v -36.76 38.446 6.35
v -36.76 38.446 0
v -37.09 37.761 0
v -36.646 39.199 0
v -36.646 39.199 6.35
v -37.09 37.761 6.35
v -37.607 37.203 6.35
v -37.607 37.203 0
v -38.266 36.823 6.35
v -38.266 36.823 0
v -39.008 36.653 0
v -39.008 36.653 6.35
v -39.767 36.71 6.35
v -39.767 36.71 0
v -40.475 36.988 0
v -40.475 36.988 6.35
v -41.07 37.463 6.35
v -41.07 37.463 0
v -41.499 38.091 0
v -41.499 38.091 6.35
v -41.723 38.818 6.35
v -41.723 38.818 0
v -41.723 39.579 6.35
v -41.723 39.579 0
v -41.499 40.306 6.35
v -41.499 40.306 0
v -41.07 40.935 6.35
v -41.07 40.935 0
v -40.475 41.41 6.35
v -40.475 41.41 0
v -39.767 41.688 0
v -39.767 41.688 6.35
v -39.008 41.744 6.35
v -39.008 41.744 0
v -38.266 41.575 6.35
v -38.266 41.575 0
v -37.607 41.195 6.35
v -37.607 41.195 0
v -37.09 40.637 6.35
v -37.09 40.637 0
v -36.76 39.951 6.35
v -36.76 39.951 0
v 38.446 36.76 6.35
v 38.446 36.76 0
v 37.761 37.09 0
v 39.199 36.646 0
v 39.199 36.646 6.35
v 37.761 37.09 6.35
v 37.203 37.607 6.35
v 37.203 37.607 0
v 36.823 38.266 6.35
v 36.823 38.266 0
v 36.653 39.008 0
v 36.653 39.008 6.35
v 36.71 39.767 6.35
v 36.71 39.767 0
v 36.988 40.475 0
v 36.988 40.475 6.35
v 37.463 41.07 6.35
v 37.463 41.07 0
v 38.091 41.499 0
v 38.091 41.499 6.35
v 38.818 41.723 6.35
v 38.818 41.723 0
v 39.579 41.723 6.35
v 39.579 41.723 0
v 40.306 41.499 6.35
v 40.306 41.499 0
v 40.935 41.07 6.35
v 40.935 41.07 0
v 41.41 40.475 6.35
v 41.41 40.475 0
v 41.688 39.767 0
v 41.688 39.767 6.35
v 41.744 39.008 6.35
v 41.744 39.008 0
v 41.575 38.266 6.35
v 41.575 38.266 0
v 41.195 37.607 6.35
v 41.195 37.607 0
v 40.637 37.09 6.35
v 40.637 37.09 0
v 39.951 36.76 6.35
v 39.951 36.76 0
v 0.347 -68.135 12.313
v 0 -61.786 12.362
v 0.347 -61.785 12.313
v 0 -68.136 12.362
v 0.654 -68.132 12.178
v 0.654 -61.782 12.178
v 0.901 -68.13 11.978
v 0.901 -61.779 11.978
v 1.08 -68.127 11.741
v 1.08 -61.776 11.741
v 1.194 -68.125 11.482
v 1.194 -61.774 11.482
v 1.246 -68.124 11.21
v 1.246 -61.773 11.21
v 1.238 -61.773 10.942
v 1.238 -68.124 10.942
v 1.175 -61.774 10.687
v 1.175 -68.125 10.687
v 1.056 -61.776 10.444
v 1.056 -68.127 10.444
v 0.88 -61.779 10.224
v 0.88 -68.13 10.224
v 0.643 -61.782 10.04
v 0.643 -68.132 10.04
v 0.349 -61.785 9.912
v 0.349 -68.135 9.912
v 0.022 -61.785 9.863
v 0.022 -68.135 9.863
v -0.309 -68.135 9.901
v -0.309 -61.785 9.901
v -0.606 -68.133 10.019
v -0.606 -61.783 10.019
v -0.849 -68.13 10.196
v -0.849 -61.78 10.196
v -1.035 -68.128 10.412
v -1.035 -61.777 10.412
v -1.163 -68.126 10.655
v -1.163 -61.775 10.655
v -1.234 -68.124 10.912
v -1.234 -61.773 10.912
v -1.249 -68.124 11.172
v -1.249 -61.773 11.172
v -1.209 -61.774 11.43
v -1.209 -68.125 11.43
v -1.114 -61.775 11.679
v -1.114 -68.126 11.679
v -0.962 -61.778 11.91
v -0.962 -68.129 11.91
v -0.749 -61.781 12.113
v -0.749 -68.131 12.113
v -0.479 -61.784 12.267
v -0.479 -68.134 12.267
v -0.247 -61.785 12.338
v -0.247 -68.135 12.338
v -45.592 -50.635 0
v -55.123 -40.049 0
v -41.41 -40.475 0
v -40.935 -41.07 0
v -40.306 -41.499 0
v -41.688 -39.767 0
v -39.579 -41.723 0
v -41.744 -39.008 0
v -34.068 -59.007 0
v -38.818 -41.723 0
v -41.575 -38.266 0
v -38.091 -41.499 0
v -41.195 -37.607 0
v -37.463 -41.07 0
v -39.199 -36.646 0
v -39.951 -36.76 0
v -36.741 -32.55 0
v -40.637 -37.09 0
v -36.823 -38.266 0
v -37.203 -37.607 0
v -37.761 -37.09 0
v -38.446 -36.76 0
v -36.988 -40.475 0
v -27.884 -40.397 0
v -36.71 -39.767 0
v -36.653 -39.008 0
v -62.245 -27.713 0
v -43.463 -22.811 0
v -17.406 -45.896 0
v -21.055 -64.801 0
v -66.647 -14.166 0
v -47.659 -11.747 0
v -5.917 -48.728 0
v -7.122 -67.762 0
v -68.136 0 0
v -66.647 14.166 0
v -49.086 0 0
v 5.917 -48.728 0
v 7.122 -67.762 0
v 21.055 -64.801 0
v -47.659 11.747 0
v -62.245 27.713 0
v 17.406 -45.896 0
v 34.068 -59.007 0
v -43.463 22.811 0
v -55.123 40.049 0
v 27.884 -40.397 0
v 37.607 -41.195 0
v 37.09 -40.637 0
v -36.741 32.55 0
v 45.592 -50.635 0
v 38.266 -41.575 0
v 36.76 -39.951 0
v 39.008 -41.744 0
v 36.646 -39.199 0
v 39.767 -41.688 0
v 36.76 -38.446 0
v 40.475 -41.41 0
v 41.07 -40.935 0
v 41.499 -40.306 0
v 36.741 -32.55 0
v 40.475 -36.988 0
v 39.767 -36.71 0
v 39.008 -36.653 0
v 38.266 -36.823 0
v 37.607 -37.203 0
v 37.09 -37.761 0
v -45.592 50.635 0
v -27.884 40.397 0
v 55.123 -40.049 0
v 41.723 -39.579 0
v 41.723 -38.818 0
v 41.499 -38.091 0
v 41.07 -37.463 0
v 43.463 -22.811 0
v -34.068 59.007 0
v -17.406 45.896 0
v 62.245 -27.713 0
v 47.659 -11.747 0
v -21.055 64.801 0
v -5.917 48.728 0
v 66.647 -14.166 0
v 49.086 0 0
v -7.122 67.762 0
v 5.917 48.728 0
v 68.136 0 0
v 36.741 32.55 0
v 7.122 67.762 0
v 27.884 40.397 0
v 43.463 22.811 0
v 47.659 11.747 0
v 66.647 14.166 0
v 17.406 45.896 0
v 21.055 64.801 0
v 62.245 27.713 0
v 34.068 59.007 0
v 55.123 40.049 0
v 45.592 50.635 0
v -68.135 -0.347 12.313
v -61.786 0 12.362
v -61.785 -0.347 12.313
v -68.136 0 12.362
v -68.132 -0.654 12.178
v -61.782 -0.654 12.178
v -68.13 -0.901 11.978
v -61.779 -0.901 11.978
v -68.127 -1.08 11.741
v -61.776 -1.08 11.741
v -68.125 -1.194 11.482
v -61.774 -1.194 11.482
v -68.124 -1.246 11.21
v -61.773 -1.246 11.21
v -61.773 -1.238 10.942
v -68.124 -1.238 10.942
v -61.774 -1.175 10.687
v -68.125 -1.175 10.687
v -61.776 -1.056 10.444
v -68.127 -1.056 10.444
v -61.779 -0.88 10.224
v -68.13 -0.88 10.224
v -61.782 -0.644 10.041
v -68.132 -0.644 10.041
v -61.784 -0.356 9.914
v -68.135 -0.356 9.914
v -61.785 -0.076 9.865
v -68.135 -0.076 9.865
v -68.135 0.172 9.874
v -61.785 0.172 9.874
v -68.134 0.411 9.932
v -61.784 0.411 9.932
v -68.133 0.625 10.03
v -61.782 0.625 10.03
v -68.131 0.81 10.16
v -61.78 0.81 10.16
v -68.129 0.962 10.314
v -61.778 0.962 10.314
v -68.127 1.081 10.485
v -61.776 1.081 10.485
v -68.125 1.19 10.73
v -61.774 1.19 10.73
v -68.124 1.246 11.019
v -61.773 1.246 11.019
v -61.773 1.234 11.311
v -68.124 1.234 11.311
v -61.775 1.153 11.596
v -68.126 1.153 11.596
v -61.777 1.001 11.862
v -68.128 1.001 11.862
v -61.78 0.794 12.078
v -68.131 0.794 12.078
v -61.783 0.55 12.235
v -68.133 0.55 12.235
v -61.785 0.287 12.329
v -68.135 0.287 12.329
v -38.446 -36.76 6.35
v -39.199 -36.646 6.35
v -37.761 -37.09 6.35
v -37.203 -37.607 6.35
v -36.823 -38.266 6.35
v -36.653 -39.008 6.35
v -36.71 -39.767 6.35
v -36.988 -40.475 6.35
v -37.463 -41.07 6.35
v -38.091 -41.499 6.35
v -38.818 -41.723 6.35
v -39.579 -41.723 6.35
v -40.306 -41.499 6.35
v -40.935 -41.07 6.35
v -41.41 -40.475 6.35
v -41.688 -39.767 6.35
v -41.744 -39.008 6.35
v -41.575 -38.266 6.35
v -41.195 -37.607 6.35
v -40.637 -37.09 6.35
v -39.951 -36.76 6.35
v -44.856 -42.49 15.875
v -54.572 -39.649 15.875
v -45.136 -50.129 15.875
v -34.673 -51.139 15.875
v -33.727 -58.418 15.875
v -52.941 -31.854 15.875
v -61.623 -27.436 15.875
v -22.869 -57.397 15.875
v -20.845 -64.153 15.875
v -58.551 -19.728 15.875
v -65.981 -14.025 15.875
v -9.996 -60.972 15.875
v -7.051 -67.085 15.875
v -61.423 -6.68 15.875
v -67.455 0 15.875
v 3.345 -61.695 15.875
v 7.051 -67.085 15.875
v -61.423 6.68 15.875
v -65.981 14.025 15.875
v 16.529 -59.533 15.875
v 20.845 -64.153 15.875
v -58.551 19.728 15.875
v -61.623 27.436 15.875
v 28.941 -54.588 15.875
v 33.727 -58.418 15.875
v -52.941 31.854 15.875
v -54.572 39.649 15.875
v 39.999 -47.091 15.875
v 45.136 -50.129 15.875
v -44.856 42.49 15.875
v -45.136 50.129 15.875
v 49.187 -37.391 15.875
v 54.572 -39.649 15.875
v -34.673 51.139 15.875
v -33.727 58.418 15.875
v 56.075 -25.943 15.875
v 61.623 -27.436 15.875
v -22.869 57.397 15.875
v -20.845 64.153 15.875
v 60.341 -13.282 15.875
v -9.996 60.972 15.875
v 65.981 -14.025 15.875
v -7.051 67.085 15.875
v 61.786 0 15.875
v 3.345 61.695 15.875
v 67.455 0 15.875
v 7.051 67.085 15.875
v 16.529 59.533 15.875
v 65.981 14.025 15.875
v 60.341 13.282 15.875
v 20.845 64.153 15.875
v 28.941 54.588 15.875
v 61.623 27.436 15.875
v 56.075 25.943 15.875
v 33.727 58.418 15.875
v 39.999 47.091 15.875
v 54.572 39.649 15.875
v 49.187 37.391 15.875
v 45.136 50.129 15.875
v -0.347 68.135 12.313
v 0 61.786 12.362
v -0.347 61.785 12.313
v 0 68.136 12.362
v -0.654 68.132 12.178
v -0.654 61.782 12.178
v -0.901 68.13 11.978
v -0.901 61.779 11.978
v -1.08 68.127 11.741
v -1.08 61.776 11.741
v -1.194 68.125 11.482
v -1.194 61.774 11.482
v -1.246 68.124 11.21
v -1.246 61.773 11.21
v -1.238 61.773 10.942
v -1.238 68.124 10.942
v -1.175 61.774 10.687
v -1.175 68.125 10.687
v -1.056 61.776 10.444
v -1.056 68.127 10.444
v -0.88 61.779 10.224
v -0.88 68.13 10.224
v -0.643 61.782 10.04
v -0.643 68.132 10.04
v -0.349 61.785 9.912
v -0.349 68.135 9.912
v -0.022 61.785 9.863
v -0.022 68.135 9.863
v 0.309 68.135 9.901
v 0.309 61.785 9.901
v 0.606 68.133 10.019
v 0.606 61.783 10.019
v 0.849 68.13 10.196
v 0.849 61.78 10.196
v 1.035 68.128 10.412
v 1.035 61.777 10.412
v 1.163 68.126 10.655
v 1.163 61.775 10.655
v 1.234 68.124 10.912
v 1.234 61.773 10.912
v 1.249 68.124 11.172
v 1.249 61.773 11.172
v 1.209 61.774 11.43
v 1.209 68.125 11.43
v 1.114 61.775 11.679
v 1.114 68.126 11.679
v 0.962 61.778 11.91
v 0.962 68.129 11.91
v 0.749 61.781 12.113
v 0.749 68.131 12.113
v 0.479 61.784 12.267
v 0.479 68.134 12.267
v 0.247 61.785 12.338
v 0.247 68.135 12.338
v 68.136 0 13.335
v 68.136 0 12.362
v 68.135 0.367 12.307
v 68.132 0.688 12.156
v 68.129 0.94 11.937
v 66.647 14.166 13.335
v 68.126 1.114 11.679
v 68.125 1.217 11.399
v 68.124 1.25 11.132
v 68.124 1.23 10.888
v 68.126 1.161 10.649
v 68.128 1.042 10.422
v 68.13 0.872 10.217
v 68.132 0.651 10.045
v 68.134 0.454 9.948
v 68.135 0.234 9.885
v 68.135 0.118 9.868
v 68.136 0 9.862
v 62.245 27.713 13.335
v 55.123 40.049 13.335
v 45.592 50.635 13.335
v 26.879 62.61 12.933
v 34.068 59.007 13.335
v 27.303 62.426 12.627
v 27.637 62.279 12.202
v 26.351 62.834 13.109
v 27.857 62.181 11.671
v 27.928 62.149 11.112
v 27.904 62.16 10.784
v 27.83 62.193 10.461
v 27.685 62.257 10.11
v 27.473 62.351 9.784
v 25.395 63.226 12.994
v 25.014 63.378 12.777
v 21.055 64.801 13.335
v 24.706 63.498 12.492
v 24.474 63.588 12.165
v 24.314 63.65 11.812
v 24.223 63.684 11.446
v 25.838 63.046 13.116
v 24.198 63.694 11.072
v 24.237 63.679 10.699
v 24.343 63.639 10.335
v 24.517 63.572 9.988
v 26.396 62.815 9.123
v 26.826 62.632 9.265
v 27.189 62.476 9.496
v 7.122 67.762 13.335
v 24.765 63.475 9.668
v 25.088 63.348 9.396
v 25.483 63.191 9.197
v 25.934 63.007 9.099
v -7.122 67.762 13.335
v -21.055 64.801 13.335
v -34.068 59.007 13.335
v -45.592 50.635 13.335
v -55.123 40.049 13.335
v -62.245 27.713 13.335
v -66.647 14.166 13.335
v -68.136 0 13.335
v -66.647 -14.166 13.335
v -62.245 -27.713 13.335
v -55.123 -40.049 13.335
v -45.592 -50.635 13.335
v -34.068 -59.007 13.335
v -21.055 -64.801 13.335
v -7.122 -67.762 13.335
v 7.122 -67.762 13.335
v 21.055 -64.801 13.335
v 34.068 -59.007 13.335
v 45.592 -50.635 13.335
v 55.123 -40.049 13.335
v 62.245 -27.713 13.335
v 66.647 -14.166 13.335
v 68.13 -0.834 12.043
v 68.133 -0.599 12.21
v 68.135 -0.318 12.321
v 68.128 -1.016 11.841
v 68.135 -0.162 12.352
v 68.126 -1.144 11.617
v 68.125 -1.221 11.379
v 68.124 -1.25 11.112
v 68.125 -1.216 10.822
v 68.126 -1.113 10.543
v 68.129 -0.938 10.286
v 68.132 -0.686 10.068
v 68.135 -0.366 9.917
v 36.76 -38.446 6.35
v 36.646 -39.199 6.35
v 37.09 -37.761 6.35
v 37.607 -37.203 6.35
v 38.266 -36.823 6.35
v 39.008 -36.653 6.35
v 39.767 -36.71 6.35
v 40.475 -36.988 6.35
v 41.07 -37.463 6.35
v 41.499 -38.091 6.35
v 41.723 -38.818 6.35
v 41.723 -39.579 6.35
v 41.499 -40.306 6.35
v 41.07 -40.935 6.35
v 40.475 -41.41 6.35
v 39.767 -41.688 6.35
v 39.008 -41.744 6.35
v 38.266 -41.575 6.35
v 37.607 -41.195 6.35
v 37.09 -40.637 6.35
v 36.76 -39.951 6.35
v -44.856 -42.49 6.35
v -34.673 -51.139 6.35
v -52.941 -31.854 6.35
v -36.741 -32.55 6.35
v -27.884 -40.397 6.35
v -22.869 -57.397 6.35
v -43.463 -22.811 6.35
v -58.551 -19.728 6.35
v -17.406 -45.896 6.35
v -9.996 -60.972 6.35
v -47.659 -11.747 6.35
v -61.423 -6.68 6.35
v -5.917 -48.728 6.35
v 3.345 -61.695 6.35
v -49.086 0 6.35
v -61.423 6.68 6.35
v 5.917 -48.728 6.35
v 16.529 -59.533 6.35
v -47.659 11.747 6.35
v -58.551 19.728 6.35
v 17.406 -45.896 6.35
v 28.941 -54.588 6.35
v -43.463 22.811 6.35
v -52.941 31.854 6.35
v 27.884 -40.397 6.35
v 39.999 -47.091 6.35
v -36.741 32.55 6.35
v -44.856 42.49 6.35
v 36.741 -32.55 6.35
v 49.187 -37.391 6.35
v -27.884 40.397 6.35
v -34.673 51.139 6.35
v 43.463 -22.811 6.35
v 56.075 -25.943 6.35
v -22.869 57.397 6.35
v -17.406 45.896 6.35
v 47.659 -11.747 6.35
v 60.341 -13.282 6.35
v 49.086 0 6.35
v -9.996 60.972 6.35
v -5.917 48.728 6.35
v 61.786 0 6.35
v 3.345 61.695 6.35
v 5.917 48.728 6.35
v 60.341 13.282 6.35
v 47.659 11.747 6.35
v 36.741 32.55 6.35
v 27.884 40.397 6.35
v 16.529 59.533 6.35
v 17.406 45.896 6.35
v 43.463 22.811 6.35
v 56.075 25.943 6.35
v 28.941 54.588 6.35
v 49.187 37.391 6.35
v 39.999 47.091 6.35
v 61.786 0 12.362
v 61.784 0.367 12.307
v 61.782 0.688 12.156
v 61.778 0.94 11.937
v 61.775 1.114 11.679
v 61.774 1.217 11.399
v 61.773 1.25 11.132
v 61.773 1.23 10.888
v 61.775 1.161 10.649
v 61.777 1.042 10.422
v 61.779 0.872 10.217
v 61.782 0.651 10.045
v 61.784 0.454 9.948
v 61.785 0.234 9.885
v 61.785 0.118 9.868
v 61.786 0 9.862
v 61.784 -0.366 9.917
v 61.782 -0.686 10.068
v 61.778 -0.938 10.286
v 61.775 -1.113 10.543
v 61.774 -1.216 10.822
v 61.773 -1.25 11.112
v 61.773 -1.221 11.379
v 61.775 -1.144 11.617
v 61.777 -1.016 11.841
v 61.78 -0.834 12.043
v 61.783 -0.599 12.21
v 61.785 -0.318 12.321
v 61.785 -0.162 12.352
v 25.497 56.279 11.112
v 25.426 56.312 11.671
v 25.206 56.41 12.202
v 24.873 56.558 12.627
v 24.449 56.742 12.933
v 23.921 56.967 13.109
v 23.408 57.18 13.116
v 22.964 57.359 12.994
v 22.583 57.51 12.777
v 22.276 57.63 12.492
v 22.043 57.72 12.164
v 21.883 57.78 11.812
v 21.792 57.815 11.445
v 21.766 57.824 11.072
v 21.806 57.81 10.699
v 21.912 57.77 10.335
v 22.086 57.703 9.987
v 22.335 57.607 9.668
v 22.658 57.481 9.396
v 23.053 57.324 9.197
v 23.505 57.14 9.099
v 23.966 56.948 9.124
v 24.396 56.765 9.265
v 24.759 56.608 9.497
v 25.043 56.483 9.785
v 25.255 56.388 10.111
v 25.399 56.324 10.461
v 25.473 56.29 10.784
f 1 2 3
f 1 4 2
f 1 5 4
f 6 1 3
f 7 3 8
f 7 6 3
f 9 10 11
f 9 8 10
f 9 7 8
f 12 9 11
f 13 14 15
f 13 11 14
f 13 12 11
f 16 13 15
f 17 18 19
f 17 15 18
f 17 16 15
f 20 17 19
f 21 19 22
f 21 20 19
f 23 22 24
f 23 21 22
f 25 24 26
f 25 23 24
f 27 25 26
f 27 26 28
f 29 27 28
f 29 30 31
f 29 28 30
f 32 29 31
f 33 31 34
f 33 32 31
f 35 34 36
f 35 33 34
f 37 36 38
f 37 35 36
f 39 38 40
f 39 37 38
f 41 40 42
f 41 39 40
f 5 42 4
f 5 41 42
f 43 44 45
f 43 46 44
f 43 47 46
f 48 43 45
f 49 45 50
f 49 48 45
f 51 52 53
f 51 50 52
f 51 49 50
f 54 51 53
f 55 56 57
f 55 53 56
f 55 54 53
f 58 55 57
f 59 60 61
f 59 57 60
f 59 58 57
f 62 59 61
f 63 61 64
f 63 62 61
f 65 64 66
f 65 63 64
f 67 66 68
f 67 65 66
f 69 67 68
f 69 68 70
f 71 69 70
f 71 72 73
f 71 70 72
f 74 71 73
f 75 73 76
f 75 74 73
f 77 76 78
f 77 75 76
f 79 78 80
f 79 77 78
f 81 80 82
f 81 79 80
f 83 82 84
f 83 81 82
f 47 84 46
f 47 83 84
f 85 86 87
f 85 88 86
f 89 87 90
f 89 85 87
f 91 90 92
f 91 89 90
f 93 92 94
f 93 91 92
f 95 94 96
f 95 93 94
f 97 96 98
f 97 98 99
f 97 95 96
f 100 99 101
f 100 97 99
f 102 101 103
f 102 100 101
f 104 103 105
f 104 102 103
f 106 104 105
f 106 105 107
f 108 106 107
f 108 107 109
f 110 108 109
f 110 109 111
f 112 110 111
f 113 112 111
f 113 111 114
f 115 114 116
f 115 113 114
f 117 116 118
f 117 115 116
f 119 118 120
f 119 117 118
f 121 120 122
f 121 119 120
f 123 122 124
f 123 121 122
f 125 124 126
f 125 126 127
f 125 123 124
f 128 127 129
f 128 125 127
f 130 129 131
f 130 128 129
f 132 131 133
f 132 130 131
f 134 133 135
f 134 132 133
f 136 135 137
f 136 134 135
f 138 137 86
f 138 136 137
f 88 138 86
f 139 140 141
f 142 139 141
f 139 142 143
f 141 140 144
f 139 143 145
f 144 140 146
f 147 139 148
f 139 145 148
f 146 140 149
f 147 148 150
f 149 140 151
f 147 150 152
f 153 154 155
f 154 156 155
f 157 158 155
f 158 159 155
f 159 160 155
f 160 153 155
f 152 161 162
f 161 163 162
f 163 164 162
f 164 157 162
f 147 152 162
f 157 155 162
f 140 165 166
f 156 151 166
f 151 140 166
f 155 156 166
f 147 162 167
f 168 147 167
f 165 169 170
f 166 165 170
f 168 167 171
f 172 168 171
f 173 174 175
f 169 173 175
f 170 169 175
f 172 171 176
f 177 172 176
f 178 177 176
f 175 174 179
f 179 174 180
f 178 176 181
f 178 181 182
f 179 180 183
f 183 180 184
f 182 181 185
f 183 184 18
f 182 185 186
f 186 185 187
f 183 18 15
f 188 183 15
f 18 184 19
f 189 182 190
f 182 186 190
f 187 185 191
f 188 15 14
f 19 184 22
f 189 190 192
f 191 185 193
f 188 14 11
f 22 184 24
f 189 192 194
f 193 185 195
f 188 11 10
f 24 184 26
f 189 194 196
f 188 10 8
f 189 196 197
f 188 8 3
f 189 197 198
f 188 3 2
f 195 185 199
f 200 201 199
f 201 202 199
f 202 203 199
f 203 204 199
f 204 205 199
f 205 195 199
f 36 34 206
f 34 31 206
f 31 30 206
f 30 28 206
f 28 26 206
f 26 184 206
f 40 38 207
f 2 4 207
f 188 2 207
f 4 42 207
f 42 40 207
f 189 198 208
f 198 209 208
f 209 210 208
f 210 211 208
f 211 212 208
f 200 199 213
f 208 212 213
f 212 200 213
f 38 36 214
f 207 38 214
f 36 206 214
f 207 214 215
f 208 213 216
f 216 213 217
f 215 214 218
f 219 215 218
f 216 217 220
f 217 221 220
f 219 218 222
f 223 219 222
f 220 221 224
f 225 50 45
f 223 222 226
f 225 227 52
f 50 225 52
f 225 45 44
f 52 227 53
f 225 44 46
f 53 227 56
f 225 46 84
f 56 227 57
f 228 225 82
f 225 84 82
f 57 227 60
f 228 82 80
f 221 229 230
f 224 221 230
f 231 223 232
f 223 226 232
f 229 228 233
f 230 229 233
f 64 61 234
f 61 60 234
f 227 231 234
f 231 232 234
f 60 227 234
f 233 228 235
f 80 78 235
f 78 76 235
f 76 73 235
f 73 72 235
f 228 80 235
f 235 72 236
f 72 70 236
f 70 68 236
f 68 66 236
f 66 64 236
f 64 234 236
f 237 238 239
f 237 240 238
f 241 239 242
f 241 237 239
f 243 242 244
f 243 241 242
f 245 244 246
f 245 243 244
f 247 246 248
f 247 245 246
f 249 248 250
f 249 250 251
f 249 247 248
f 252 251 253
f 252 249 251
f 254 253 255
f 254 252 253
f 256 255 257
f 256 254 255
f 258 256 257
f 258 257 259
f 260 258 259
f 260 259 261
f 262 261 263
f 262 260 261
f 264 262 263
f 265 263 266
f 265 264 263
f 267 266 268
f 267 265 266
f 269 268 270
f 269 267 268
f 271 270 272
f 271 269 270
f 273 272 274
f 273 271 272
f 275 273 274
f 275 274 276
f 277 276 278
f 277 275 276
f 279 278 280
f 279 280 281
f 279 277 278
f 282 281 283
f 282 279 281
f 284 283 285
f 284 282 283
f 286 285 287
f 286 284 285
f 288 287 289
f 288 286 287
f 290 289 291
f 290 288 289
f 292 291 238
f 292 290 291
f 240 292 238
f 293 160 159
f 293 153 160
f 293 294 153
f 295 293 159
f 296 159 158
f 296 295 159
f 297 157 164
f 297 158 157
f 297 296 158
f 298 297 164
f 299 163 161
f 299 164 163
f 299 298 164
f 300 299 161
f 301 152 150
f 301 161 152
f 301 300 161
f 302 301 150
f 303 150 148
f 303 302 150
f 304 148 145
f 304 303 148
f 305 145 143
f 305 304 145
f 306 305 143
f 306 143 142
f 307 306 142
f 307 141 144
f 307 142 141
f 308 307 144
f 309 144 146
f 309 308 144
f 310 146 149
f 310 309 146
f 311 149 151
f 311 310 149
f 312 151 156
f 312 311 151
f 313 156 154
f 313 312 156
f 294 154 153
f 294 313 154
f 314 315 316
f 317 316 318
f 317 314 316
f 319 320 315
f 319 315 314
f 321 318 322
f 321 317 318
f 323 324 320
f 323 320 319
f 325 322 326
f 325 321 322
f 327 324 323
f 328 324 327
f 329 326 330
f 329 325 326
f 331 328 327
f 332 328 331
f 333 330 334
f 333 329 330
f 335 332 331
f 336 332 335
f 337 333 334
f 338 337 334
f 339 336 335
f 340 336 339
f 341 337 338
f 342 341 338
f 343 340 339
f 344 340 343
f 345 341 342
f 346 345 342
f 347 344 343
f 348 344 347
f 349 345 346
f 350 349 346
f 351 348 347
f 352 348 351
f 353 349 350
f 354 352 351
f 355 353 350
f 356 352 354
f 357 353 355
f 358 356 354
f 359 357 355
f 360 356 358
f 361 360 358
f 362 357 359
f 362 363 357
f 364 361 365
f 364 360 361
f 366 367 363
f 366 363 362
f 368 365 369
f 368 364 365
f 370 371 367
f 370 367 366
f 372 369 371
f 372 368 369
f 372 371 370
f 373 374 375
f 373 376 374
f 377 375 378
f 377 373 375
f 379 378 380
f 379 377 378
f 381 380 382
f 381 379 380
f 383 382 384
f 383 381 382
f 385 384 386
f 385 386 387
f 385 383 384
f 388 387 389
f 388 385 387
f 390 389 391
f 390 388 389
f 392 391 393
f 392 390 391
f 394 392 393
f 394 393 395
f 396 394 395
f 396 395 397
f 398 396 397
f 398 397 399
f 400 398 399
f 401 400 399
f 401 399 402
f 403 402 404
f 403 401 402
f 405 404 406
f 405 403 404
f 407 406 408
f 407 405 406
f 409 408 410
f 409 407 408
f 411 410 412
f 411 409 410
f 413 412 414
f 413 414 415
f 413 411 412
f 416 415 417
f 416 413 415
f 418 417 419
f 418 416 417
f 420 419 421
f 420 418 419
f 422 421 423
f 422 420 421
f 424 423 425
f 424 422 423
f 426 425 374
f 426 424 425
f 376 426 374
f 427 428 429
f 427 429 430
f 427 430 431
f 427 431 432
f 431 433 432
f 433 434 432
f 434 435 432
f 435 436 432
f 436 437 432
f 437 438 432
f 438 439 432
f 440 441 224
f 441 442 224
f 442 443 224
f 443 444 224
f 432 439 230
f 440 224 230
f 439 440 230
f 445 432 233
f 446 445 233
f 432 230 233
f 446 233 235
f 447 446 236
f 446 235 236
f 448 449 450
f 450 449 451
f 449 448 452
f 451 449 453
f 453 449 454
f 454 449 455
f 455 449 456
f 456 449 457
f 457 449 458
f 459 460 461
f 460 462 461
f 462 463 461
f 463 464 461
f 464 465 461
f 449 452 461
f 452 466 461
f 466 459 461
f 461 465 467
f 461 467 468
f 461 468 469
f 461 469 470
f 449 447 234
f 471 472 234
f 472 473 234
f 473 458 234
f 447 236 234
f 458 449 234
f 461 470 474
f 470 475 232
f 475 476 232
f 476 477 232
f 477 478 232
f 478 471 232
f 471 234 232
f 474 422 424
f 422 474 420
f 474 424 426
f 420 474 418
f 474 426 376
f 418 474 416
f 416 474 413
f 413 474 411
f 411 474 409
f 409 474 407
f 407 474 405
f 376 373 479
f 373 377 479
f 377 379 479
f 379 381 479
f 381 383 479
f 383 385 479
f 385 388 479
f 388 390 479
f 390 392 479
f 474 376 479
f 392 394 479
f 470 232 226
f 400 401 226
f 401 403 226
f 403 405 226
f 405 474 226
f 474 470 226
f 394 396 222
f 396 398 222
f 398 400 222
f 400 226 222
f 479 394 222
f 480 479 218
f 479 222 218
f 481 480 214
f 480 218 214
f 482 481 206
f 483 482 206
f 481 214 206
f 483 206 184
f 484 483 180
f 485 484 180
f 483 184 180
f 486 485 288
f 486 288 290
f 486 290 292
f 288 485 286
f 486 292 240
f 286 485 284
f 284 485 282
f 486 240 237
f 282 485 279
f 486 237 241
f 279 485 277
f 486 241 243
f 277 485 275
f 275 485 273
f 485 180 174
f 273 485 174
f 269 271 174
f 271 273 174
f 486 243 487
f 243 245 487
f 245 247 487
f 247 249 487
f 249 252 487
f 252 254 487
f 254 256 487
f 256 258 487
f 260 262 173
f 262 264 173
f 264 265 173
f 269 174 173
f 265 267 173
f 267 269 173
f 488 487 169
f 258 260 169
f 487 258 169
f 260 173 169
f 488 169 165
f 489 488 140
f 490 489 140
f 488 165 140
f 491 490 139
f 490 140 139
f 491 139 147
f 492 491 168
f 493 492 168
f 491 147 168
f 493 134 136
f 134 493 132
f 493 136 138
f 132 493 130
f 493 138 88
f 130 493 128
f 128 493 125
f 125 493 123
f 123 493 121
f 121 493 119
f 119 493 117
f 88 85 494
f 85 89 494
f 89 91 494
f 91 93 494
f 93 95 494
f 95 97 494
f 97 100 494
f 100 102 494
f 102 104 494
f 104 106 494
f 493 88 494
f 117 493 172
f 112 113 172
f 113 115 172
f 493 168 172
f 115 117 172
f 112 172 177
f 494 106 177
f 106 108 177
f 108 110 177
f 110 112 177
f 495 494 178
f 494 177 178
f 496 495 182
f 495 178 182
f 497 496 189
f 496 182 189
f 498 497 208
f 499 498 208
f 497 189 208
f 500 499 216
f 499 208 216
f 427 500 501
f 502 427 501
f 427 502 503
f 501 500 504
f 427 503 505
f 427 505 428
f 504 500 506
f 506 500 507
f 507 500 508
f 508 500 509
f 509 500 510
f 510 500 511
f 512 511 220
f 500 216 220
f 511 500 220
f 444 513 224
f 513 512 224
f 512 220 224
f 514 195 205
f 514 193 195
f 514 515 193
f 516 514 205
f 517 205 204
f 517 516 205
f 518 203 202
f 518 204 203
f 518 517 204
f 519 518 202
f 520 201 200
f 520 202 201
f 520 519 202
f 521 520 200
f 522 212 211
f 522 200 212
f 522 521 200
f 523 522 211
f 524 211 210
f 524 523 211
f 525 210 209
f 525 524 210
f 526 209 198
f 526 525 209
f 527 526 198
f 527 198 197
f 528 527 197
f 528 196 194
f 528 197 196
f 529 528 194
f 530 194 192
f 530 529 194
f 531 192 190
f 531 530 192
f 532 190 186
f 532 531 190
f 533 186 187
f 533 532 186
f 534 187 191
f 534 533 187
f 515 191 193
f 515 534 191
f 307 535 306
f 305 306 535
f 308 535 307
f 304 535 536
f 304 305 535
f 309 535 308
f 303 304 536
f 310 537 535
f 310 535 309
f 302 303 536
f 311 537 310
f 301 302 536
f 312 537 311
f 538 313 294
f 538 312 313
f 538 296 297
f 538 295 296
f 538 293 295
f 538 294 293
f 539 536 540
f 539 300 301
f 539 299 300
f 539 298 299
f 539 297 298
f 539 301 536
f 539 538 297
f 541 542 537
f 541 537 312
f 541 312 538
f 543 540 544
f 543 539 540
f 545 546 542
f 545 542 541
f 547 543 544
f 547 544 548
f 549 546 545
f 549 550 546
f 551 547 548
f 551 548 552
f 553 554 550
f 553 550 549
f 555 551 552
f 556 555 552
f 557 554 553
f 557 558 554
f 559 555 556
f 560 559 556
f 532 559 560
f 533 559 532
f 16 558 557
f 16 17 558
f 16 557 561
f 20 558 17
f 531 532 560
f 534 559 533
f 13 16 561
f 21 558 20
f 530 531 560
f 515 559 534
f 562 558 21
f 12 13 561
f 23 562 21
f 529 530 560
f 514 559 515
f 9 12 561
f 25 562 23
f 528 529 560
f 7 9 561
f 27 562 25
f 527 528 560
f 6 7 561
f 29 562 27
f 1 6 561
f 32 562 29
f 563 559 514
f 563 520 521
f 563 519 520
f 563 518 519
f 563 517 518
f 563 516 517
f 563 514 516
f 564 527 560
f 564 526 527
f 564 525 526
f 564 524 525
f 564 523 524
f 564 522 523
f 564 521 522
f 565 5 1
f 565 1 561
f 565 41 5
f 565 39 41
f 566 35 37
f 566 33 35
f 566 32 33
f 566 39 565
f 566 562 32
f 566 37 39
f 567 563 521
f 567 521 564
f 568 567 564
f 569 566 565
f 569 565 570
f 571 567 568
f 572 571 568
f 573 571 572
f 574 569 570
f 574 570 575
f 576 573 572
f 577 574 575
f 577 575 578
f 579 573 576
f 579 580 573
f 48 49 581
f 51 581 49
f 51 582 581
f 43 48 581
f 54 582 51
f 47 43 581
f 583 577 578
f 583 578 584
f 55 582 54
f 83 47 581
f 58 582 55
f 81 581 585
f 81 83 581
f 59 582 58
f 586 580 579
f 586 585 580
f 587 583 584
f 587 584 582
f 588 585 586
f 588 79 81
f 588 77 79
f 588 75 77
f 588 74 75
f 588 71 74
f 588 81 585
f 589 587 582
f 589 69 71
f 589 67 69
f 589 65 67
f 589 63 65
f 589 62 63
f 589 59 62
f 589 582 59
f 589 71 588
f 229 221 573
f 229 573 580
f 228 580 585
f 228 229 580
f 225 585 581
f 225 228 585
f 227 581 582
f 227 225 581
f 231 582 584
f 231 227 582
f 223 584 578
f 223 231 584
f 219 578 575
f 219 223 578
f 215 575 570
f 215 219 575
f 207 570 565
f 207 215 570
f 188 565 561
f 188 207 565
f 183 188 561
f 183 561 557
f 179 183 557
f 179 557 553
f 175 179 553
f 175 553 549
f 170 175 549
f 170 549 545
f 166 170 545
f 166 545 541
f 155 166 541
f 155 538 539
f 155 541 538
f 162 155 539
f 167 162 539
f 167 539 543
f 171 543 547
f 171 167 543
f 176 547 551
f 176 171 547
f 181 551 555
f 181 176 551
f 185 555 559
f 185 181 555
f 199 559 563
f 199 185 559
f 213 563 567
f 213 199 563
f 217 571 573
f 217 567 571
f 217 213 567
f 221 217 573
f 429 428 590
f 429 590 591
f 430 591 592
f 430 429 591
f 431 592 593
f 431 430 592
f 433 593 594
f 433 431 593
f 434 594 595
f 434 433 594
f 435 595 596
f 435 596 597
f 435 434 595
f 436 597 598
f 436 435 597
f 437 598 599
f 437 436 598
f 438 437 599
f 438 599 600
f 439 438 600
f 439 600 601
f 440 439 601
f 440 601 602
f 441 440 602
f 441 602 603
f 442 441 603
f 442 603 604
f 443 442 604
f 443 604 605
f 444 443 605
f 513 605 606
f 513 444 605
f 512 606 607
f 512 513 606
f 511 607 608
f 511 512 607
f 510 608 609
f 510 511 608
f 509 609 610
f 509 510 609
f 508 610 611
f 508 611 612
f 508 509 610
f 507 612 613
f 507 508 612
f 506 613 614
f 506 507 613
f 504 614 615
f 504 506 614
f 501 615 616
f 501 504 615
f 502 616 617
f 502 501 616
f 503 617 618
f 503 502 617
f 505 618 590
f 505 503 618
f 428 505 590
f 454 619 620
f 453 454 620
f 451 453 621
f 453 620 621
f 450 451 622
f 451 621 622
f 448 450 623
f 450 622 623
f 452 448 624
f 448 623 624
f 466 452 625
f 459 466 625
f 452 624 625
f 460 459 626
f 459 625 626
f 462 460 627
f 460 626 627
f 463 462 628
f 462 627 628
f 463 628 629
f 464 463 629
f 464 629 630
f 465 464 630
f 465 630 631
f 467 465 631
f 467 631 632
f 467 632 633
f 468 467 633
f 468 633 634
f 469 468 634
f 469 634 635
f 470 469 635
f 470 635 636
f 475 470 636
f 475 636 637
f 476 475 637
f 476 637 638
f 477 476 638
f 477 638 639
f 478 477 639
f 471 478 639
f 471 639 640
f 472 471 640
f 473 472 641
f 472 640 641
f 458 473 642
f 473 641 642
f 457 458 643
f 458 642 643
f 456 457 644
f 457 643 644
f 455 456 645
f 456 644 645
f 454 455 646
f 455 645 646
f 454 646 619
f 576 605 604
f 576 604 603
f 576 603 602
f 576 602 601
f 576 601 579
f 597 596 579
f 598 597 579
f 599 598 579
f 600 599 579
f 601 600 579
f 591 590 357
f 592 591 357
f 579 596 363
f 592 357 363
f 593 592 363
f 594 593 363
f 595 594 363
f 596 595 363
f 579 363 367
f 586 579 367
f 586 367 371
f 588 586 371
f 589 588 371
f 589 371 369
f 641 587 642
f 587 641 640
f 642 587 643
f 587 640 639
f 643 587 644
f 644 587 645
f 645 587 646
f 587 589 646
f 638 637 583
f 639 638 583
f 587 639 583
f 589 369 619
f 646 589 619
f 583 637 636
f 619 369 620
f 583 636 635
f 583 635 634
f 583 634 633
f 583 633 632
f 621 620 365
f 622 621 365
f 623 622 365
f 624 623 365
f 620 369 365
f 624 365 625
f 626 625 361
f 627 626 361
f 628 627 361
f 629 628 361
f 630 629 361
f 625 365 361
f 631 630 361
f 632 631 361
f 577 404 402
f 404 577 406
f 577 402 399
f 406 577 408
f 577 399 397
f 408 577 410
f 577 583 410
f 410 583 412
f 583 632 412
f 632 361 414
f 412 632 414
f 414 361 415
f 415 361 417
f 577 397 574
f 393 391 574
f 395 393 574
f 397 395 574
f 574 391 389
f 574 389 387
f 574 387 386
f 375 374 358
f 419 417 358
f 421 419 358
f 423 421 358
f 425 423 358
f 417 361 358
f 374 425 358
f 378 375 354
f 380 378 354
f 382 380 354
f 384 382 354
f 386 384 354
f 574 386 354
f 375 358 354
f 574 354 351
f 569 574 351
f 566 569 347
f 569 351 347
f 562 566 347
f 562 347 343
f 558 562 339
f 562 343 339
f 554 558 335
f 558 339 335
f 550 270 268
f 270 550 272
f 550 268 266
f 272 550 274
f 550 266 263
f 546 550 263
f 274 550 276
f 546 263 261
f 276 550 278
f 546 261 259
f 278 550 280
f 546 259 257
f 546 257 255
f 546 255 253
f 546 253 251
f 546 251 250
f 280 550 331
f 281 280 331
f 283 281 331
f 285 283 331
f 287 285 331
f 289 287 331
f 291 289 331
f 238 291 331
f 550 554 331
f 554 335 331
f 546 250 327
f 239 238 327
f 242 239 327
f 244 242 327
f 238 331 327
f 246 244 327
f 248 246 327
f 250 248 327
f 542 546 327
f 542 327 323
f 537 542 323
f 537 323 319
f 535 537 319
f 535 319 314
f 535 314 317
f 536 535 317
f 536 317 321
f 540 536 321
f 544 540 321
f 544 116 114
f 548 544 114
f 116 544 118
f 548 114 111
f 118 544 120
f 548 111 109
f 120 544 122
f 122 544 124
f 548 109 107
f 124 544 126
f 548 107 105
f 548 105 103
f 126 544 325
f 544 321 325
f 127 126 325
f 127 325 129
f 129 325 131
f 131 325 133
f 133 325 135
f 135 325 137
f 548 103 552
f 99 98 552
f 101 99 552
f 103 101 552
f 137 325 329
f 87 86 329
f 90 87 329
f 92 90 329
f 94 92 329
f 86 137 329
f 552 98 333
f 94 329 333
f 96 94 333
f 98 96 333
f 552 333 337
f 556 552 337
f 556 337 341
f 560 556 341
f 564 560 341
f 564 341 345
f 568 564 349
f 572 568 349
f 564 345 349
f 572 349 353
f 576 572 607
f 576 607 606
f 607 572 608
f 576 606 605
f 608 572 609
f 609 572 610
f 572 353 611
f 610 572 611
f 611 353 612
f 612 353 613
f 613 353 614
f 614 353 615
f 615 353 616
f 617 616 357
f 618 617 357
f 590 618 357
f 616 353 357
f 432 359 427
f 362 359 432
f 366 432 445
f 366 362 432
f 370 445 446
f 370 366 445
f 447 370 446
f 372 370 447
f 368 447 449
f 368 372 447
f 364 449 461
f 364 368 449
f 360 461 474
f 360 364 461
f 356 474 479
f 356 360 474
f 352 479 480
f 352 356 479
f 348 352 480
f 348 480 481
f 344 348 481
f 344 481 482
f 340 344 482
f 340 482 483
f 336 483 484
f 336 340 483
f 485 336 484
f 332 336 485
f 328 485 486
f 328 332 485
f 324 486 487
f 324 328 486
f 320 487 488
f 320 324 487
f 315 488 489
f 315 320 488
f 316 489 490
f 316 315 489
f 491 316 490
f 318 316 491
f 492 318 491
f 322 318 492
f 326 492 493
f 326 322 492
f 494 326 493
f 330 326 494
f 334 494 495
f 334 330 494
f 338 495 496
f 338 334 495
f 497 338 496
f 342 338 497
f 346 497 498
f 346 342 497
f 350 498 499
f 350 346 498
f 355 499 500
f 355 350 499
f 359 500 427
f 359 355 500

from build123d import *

# Parameters (mm, degrees)
SKETCH1_R                      = 68.1355
SKETCH1_R_2                    = 49.0855
EXTRUDE1_DEPTH                 = 15.875
SKETCH2_R                      = 61.7855
EXTRUDE2_DEPTH                 = 9.525
TAP_DRILL_FOR_10_32_TAP1_D     = 4.0386
TAP_DRILL_FOR_10_32_TAP1_DEPTH = 12.7
TAP_DRILL_FOR_10_32_TAP1_TIP   = 1.213317848
CIRPATTERN1_COUNT              = 4
CIRPATTERN2_COUNT              = 4
CHAMFER1_SIZE                  = 2.54
CHAMFER1_SIZE2                 = 0.680590949


with BuildPart() as part:
    # Sketch1 → Extrude1 (new body)
    with BuildSketch(Plane.XY):
        Circle(SKETCH1_R)
        Circle(SKETCH1_R_2, mode=Mode.SUBTRACT)
    extrude(amount=EXTRUDE1_DEPTH)

    # Sketch2 → Extrude2 (cut)
    with BuildSketch(Plane.XY.offset(15.875)):
        Circle(SKETCH2_R)
    extrude(amount=-EXTRUDE2_DEPTH, mode=Mode.SUBTRACT)

    # Tap Drill for #10-32 Tap1
    with Locations(Plane(origin=(26.074327006, 62.948993887, 11.1125), x_dir=(-0.9238795325112864, 0.38268343236509067, 0), z_dir=(0.38268343236509067, 0.9238795325112864, 0))):
        with Locations((0, 0)):
            Hole(TAP_DRILL_FOR_10_32_TAP1_D / 2, depth=TAP_DRILL_FOR_10_32_TAP1_DEPTH)
            with Locations((0, 0, -(TAP_DRILL_FOR_10_32_TAP1_DEPTH + TAP_DRILL_FOR_10_32_TAP1_TIP / 2))):  # 118° drill point
                Cone(0, TAP_DRILL_FOR_10_32_TAP1_D / 2, TAP_DRILL_FOR_10_32_TAP1_TIP, mode=Mode.SUBTRACT)

    # Sketch4 → M3x0.5 Tapped Hole1 (revolve, cut)
    with BuildSketch(Plane(origin=(0, 68.1355, 11.1125), x_dir=(0, 0, 1), z_dir=(1, 0, 0))):
        Polygon((0, 0), (0, 9.387075774), (1.25, 8.636), (1.25, 0), align=None)
    m3x0_5_tapped_hole1 = revolve(axis=Axis((0, 74.4855, 11.1125), (0, -1, 0)), mode=Mode.SUBTRACT)

    # CirPattern1: M3x0.5 Tapped Hole1 ×4 about axis
    cirpattern1_axis = Axis((0, 0, 15.875), (0, 0, -1))
    for i in range(1, CIRPATTERN1_COUNT):
        add(m3x0_5_tapped_hole1.rotate(cirpattern1_axis, i * 360 / CIRPATTERN1_COUNT), mode=Mode.SUBTRACT)

    # Sketch8 → 1/4-20 Tapped Hole1 (revolve, cut)
    with BuildSketch(Plane(origin=(39.198817968, 39.198817968, 11.1125), x_dir=(0, -1, 0), z_dir=(1, 0, 0))):
        Polygon((0, 0), (0, 18.043816902), (2.5527, 16.51), (2.5527, 0), align=None)
    f_1_4_20_tapped_hole1 = revolve(axis=Axis((39.198817968, 39.198817968, 17.4625), (0, 0, -1)), mode=Mode.SUBTRACT)

    # CirPattern2: 1/4-20 Tapped Hole1 ×4 about axis
    cirpattern2_axis = Axis((0, 0, 0), (0, 0, 1))
    for i in range(1, CIRPATTERN2_COUNT):
        add(f_1_4_20_tapped_hole1.rotate(cirpattern2_axis, i * 360 / CIRPATTERN2_COUNT), mode=Mode.SUBTRACT)

    # Chamfer1
    chamfer1_edges = [part.edges().sort_by_distance(p)[0] for p in [
        (-68.1355, 0, 15.875),
    ]]
    chamfer1_side = [part.faces().sort_by_distance(p)[0] for p in [
        (-68.1355, 0, 7.9375),
    ]]
    chamfer(chamfer1_edges, length=CHAMFER1_SIZE, length2=CHAMFER1_SIZE2, reference=chamfer1_side[0])


solid = part.part
